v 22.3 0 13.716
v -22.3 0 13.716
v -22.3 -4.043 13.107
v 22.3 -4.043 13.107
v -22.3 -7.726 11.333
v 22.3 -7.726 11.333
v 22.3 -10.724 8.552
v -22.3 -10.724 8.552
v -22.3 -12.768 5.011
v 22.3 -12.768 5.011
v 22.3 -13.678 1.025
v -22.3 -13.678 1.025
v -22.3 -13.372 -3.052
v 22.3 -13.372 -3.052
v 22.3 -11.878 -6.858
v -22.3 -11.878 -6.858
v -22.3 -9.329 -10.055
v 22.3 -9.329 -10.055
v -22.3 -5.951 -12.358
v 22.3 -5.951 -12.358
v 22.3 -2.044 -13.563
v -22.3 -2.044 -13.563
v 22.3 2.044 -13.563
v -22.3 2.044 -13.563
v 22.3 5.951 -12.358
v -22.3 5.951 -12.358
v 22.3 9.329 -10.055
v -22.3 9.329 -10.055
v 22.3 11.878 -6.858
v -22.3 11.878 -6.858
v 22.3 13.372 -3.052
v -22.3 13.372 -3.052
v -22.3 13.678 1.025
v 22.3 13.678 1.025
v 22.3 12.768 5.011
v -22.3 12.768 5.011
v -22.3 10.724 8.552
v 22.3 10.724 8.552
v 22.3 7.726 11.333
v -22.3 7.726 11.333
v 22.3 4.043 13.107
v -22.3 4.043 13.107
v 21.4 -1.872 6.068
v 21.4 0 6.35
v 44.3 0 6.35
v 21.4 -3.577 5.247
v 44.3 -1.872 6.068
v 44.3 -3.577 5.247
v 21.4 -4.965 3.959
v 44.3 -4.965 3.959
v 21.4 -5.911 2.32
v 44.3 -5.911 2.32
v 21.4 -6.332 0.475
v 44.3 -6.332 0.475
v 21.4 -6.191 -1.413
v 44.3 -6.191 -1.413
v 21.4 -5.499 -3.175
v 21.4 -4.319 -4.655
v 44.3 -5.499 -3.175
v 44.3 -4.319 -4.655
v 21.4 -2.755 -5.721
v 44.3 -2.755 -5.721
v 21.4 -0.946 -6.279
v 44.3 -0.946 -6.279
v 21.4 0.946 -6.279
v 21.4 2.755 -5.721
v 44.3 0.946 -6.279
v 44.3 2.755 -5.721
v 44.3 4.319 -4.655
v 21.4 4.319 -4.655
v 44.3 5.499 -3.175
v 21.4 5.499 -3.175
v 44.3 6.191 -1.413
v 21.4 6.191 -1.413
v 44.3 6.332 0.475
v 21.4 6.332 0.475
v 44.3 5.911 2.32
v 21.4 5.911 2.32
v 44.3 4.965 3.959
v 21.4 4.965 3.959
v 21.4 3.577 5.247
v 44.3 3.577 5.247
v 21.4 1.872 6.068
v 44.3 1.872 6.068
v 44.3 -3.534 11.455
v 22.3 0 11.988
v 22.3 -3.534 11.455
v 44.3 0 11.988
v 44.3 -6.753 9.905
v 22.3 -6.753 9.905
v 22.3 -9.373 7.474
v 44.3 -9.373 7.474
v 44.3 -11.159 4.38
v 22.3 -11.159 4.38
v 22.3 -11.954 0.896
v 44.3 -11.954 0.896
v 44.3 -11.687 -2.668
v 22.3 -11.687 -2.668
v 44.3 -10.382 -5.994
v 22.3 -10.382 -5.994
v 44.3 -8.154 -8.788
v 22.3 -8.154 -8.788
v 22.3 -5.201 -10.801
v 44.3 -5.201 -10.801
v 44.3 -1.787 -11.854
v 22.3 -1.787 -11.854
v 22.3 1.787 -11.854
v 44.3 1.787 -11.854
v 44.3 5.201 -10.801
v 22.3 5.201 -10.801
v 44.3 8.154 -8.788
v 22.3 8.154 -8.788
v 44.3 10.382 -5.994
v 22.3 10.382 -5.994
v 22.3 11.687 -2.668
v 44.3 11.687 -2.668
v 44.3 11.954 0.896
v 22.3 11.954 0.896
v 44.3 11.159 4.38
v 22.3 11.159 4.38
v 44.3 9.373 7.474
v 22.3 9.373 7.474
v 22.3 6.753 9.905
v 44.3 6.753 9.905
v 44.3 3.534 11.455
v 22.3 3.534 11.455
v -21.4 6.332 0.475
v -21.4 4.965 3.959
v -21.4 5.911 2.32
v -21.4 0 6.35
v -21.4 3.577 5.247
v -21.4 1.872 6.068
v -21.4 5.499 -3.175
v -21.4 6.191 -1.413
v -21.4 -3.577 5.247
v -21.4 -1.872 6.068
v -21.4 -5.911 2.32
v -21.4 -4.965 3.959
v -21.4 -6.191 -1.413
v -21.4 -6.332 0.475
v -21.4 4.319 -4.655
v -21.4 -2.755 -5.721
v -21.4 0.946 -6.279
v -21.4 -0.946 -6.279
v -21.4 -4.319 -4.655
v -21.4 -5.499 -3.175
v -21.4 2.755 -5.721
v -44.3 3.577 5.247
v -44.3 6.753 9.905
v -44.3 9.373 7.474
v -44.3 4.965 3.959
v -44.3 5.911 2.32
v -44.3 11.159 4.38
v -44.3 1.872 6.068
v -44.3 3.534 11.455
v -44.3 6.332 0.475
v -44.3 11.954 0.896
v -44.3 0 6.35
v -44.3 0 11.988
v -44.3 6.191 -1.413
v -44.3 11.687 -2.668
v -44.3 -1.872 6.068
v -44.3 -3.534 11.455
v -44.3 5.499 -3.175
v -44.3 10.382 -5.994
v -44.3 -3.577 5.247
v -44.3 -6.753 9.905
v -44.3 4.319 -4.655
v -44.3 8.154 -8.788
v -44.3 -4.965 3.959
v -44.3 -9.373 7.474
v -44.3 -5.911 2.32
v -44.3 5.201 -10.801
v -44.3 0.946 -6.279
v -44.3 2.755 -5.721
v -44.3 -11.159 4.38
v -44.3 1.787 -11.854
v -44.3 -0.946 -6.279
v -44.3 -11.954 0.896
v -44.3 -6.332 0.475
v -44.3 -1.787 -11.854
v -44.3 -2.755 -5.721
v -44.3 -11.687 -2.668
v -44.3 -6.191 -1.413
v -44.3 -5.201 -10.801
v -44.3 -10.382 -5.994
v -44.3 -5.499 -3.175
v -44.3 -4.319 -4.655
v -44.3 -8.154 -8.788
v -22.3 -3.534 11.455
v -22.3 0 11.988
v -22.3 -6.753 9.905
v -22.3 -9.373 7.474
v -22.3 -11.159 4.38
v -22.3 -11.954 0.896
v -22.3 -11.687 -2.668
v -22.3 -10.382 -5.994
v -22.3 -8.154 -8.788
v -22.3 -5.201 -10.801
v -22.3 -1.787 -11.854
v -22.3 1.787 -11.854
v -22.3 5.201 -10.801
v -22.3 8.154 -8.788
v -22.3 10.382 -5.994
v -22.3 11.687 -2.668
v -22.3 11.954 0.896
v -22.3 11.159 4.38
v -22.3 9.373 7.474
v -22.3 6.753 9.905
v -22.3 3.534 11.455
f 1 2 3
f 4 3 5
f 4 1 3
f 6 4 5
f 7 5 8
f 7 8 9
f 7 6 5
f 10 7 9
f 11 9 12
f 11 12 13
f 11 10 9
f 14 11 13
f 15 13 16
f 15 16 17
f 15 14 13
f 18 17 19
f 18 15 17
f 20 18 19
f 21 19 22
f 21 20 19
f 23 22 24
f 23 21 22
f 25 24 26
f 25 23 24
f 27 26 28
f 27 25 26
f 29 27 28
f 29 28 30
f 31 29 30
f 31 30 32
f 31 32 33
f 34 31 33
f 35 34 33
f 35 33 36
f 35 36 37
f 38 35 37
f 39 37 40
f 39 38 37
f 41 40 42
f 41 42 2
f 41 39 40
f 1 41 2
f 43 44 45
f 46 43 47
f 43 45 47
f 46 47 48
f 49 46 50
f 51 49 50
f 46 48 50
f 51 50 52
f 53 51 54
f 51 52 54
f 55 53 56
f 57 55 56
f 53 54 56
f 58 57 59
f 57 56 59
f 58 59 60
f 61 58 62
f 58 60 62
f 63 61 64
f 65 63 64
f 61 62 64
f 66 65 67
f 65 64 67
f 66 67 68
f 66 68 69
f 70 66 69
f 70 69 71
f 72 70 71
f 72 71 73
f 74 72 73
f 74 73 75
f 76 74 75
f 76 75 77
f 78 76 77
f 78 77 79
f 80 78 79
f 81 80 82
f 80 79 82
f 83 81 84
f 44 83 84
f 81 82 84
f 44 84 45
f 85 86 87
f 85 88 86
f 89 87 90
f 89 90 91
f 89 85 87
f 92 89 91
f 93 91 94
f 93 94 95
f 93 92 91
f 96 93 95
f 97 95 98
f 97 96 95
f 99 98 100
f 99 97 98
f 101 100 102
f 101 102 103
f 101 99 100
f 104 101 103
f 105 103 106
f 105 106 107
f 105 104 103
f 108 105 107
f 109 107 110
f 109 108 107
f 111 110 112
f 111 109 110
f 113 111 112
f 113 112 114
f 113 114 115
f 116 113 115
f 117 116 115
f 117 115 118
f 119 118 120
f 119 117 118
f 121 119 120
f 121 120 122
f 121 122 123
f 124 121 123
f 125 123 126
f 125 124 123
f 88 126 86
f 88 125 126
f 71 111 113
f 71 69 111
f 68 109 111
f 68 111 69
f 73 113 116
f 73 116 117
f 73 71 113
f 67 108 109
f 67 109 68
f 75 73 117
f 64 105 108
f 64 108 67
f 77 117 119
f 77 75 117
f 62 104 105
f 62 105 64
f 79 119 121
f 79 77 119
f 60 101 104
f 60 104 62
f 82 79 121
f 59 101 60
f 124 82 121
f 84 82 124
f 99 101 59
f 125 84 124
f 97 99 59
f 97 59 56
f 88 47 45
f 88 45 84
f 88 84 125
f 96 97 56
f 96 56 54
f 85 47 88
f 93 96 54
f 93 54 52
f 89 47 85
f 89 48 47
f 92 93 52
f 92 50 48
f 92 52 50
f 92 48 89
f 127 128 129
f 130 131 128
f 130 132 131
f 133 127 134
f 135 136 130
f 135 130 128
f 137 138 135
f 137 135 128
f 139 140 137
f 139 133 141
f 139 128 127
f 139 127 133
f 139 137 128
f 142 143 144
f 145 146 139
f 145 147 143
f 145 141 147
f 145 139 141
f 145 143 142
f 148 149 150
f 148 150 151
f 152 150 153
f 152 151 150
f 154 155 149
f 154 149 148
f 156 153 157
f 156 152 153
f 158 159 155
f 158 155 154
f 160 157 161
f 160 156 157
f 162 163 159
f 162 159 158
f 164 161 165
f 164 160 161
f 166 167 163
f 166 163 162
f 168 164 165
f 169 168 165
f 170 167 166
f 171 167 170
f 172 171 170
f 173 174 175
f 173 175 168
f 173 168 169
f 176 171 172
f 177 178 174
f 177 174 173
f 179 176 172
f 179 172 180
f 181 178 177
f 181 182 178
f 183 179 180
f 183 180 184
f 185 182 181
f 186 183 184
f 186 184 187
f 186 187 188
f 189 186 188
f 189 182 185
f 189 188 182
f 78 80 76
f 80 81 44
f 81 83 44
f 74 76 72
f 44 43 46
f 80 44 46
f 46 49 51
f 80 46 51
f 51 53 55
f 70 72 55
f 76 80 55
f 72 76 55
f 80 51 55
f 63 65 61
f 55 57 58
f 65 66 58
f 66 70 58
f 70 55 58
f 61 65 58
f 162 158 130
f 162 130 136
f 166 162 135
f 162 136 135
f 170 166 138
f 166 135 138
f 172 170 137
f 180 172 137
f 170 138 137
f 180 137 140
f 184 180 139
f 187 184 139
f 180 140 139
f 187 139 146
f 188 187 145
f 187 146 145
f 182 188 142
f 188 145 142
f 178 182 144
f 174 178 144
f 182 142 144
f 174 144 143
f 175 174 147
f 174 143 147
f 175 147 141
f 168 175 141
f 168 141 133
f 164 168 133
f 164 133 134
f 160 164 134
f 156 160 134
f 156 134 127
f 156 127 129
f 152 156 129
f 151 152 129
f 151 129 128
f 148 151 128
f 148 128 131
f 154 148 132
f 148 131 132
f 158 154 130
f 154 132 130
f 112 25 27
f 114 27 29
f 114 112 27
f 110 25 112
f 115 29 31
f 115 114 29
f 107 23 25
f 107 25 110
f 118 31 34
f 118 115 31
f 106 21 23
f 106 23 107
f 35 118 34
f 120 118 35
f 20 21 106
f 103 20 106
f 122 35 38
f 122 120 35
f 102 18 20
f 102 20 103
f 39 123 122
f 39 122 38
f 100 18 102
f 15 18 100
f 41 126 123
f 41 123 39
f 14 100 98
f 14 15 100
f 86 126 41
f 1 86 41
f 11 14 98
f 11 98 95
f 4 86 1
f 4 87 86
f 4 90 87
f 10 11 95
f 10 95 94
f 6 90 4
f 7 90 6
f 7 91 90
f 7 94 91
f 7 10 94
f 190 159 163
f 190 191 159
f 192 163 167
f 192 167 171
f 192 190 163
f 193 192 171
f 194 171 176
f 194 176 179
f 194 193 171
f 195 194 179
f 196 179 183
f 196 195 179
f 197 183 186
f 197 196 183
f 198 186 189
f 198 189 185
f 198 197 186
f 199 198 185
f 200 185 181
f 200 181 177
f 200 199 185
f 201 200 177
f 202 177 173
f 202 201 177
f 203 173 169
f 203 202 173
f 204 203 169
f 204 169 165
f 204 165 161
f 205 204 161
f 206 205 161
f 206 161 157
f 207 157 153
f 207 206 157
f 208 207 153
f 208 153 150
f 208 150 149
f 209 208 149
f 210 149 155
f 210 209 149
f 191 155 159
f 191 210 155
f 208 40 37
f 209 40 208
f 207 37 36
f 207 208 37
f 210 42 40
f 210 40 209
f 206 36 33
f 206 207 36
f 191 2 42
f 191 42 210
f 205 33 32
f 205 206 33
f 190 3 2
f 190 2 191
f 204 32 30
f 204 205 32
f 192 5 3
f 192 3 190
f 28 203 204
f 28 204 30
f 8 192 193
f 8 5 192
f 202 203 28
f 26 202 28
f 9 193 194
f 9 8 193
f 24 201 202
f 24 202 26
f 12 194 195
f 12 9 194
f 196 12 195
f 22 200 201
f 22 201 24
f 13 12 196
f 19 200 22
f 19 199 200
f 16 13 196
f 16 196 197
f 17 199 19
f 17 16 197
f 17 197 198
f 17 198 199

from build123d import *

# Parameters (mm, degrees)
SOCKET_1_SKETCH_W = 23.9
SOCKET_1_SKETCH_H = 6.35
SOCKET_2_SKETCH_W = 23.9
SOCKET_2_SKETCH_H = 6.35


with BuildPart() as part:
    # Filter_F1 Sketch → Filter_F1 (revolve)
    with BuildSketch(Plane.XY):
        Polygon((-44.3, 0), (-44.3, 11.988), (-22.3, 11.988), (-22.3, 13.716), (22.3, 13.716), (22.3, 11.988), (44.3, 11.988), (44.3, 0), align=None)
    revolve(axis=Axis((-1000, 0, 0), (1, 0, 0)))

    # Socket 1 Sketch → Socket 1 (revolve, cut)
    with BuildSketch(Plane.XY):
        with Locations((-33.35, 3.175)):
            Rectangle(SOCKET_1_SKETCH_W, SOCKET_1_SKETCH_H)
    revolve(axis=Axis((-1000, 0, 0), (1, 0, 0)), mode=Mode.SUBTRACT)

    # Socket 2 Sketch → Socket 2 (revolve, cut)
    with BuildSketch(Plane.XY):
        with Locations((33.35, 3.175)):
            Rectangle(SOCKET_2_SKETCH_W, SOCKET_2_SKETCH_H)
    revolve(axis=Axis((-1000, 0, 0), (1, 0, 0)), mode=Mode.SUBTRACT)


solid = part.part
